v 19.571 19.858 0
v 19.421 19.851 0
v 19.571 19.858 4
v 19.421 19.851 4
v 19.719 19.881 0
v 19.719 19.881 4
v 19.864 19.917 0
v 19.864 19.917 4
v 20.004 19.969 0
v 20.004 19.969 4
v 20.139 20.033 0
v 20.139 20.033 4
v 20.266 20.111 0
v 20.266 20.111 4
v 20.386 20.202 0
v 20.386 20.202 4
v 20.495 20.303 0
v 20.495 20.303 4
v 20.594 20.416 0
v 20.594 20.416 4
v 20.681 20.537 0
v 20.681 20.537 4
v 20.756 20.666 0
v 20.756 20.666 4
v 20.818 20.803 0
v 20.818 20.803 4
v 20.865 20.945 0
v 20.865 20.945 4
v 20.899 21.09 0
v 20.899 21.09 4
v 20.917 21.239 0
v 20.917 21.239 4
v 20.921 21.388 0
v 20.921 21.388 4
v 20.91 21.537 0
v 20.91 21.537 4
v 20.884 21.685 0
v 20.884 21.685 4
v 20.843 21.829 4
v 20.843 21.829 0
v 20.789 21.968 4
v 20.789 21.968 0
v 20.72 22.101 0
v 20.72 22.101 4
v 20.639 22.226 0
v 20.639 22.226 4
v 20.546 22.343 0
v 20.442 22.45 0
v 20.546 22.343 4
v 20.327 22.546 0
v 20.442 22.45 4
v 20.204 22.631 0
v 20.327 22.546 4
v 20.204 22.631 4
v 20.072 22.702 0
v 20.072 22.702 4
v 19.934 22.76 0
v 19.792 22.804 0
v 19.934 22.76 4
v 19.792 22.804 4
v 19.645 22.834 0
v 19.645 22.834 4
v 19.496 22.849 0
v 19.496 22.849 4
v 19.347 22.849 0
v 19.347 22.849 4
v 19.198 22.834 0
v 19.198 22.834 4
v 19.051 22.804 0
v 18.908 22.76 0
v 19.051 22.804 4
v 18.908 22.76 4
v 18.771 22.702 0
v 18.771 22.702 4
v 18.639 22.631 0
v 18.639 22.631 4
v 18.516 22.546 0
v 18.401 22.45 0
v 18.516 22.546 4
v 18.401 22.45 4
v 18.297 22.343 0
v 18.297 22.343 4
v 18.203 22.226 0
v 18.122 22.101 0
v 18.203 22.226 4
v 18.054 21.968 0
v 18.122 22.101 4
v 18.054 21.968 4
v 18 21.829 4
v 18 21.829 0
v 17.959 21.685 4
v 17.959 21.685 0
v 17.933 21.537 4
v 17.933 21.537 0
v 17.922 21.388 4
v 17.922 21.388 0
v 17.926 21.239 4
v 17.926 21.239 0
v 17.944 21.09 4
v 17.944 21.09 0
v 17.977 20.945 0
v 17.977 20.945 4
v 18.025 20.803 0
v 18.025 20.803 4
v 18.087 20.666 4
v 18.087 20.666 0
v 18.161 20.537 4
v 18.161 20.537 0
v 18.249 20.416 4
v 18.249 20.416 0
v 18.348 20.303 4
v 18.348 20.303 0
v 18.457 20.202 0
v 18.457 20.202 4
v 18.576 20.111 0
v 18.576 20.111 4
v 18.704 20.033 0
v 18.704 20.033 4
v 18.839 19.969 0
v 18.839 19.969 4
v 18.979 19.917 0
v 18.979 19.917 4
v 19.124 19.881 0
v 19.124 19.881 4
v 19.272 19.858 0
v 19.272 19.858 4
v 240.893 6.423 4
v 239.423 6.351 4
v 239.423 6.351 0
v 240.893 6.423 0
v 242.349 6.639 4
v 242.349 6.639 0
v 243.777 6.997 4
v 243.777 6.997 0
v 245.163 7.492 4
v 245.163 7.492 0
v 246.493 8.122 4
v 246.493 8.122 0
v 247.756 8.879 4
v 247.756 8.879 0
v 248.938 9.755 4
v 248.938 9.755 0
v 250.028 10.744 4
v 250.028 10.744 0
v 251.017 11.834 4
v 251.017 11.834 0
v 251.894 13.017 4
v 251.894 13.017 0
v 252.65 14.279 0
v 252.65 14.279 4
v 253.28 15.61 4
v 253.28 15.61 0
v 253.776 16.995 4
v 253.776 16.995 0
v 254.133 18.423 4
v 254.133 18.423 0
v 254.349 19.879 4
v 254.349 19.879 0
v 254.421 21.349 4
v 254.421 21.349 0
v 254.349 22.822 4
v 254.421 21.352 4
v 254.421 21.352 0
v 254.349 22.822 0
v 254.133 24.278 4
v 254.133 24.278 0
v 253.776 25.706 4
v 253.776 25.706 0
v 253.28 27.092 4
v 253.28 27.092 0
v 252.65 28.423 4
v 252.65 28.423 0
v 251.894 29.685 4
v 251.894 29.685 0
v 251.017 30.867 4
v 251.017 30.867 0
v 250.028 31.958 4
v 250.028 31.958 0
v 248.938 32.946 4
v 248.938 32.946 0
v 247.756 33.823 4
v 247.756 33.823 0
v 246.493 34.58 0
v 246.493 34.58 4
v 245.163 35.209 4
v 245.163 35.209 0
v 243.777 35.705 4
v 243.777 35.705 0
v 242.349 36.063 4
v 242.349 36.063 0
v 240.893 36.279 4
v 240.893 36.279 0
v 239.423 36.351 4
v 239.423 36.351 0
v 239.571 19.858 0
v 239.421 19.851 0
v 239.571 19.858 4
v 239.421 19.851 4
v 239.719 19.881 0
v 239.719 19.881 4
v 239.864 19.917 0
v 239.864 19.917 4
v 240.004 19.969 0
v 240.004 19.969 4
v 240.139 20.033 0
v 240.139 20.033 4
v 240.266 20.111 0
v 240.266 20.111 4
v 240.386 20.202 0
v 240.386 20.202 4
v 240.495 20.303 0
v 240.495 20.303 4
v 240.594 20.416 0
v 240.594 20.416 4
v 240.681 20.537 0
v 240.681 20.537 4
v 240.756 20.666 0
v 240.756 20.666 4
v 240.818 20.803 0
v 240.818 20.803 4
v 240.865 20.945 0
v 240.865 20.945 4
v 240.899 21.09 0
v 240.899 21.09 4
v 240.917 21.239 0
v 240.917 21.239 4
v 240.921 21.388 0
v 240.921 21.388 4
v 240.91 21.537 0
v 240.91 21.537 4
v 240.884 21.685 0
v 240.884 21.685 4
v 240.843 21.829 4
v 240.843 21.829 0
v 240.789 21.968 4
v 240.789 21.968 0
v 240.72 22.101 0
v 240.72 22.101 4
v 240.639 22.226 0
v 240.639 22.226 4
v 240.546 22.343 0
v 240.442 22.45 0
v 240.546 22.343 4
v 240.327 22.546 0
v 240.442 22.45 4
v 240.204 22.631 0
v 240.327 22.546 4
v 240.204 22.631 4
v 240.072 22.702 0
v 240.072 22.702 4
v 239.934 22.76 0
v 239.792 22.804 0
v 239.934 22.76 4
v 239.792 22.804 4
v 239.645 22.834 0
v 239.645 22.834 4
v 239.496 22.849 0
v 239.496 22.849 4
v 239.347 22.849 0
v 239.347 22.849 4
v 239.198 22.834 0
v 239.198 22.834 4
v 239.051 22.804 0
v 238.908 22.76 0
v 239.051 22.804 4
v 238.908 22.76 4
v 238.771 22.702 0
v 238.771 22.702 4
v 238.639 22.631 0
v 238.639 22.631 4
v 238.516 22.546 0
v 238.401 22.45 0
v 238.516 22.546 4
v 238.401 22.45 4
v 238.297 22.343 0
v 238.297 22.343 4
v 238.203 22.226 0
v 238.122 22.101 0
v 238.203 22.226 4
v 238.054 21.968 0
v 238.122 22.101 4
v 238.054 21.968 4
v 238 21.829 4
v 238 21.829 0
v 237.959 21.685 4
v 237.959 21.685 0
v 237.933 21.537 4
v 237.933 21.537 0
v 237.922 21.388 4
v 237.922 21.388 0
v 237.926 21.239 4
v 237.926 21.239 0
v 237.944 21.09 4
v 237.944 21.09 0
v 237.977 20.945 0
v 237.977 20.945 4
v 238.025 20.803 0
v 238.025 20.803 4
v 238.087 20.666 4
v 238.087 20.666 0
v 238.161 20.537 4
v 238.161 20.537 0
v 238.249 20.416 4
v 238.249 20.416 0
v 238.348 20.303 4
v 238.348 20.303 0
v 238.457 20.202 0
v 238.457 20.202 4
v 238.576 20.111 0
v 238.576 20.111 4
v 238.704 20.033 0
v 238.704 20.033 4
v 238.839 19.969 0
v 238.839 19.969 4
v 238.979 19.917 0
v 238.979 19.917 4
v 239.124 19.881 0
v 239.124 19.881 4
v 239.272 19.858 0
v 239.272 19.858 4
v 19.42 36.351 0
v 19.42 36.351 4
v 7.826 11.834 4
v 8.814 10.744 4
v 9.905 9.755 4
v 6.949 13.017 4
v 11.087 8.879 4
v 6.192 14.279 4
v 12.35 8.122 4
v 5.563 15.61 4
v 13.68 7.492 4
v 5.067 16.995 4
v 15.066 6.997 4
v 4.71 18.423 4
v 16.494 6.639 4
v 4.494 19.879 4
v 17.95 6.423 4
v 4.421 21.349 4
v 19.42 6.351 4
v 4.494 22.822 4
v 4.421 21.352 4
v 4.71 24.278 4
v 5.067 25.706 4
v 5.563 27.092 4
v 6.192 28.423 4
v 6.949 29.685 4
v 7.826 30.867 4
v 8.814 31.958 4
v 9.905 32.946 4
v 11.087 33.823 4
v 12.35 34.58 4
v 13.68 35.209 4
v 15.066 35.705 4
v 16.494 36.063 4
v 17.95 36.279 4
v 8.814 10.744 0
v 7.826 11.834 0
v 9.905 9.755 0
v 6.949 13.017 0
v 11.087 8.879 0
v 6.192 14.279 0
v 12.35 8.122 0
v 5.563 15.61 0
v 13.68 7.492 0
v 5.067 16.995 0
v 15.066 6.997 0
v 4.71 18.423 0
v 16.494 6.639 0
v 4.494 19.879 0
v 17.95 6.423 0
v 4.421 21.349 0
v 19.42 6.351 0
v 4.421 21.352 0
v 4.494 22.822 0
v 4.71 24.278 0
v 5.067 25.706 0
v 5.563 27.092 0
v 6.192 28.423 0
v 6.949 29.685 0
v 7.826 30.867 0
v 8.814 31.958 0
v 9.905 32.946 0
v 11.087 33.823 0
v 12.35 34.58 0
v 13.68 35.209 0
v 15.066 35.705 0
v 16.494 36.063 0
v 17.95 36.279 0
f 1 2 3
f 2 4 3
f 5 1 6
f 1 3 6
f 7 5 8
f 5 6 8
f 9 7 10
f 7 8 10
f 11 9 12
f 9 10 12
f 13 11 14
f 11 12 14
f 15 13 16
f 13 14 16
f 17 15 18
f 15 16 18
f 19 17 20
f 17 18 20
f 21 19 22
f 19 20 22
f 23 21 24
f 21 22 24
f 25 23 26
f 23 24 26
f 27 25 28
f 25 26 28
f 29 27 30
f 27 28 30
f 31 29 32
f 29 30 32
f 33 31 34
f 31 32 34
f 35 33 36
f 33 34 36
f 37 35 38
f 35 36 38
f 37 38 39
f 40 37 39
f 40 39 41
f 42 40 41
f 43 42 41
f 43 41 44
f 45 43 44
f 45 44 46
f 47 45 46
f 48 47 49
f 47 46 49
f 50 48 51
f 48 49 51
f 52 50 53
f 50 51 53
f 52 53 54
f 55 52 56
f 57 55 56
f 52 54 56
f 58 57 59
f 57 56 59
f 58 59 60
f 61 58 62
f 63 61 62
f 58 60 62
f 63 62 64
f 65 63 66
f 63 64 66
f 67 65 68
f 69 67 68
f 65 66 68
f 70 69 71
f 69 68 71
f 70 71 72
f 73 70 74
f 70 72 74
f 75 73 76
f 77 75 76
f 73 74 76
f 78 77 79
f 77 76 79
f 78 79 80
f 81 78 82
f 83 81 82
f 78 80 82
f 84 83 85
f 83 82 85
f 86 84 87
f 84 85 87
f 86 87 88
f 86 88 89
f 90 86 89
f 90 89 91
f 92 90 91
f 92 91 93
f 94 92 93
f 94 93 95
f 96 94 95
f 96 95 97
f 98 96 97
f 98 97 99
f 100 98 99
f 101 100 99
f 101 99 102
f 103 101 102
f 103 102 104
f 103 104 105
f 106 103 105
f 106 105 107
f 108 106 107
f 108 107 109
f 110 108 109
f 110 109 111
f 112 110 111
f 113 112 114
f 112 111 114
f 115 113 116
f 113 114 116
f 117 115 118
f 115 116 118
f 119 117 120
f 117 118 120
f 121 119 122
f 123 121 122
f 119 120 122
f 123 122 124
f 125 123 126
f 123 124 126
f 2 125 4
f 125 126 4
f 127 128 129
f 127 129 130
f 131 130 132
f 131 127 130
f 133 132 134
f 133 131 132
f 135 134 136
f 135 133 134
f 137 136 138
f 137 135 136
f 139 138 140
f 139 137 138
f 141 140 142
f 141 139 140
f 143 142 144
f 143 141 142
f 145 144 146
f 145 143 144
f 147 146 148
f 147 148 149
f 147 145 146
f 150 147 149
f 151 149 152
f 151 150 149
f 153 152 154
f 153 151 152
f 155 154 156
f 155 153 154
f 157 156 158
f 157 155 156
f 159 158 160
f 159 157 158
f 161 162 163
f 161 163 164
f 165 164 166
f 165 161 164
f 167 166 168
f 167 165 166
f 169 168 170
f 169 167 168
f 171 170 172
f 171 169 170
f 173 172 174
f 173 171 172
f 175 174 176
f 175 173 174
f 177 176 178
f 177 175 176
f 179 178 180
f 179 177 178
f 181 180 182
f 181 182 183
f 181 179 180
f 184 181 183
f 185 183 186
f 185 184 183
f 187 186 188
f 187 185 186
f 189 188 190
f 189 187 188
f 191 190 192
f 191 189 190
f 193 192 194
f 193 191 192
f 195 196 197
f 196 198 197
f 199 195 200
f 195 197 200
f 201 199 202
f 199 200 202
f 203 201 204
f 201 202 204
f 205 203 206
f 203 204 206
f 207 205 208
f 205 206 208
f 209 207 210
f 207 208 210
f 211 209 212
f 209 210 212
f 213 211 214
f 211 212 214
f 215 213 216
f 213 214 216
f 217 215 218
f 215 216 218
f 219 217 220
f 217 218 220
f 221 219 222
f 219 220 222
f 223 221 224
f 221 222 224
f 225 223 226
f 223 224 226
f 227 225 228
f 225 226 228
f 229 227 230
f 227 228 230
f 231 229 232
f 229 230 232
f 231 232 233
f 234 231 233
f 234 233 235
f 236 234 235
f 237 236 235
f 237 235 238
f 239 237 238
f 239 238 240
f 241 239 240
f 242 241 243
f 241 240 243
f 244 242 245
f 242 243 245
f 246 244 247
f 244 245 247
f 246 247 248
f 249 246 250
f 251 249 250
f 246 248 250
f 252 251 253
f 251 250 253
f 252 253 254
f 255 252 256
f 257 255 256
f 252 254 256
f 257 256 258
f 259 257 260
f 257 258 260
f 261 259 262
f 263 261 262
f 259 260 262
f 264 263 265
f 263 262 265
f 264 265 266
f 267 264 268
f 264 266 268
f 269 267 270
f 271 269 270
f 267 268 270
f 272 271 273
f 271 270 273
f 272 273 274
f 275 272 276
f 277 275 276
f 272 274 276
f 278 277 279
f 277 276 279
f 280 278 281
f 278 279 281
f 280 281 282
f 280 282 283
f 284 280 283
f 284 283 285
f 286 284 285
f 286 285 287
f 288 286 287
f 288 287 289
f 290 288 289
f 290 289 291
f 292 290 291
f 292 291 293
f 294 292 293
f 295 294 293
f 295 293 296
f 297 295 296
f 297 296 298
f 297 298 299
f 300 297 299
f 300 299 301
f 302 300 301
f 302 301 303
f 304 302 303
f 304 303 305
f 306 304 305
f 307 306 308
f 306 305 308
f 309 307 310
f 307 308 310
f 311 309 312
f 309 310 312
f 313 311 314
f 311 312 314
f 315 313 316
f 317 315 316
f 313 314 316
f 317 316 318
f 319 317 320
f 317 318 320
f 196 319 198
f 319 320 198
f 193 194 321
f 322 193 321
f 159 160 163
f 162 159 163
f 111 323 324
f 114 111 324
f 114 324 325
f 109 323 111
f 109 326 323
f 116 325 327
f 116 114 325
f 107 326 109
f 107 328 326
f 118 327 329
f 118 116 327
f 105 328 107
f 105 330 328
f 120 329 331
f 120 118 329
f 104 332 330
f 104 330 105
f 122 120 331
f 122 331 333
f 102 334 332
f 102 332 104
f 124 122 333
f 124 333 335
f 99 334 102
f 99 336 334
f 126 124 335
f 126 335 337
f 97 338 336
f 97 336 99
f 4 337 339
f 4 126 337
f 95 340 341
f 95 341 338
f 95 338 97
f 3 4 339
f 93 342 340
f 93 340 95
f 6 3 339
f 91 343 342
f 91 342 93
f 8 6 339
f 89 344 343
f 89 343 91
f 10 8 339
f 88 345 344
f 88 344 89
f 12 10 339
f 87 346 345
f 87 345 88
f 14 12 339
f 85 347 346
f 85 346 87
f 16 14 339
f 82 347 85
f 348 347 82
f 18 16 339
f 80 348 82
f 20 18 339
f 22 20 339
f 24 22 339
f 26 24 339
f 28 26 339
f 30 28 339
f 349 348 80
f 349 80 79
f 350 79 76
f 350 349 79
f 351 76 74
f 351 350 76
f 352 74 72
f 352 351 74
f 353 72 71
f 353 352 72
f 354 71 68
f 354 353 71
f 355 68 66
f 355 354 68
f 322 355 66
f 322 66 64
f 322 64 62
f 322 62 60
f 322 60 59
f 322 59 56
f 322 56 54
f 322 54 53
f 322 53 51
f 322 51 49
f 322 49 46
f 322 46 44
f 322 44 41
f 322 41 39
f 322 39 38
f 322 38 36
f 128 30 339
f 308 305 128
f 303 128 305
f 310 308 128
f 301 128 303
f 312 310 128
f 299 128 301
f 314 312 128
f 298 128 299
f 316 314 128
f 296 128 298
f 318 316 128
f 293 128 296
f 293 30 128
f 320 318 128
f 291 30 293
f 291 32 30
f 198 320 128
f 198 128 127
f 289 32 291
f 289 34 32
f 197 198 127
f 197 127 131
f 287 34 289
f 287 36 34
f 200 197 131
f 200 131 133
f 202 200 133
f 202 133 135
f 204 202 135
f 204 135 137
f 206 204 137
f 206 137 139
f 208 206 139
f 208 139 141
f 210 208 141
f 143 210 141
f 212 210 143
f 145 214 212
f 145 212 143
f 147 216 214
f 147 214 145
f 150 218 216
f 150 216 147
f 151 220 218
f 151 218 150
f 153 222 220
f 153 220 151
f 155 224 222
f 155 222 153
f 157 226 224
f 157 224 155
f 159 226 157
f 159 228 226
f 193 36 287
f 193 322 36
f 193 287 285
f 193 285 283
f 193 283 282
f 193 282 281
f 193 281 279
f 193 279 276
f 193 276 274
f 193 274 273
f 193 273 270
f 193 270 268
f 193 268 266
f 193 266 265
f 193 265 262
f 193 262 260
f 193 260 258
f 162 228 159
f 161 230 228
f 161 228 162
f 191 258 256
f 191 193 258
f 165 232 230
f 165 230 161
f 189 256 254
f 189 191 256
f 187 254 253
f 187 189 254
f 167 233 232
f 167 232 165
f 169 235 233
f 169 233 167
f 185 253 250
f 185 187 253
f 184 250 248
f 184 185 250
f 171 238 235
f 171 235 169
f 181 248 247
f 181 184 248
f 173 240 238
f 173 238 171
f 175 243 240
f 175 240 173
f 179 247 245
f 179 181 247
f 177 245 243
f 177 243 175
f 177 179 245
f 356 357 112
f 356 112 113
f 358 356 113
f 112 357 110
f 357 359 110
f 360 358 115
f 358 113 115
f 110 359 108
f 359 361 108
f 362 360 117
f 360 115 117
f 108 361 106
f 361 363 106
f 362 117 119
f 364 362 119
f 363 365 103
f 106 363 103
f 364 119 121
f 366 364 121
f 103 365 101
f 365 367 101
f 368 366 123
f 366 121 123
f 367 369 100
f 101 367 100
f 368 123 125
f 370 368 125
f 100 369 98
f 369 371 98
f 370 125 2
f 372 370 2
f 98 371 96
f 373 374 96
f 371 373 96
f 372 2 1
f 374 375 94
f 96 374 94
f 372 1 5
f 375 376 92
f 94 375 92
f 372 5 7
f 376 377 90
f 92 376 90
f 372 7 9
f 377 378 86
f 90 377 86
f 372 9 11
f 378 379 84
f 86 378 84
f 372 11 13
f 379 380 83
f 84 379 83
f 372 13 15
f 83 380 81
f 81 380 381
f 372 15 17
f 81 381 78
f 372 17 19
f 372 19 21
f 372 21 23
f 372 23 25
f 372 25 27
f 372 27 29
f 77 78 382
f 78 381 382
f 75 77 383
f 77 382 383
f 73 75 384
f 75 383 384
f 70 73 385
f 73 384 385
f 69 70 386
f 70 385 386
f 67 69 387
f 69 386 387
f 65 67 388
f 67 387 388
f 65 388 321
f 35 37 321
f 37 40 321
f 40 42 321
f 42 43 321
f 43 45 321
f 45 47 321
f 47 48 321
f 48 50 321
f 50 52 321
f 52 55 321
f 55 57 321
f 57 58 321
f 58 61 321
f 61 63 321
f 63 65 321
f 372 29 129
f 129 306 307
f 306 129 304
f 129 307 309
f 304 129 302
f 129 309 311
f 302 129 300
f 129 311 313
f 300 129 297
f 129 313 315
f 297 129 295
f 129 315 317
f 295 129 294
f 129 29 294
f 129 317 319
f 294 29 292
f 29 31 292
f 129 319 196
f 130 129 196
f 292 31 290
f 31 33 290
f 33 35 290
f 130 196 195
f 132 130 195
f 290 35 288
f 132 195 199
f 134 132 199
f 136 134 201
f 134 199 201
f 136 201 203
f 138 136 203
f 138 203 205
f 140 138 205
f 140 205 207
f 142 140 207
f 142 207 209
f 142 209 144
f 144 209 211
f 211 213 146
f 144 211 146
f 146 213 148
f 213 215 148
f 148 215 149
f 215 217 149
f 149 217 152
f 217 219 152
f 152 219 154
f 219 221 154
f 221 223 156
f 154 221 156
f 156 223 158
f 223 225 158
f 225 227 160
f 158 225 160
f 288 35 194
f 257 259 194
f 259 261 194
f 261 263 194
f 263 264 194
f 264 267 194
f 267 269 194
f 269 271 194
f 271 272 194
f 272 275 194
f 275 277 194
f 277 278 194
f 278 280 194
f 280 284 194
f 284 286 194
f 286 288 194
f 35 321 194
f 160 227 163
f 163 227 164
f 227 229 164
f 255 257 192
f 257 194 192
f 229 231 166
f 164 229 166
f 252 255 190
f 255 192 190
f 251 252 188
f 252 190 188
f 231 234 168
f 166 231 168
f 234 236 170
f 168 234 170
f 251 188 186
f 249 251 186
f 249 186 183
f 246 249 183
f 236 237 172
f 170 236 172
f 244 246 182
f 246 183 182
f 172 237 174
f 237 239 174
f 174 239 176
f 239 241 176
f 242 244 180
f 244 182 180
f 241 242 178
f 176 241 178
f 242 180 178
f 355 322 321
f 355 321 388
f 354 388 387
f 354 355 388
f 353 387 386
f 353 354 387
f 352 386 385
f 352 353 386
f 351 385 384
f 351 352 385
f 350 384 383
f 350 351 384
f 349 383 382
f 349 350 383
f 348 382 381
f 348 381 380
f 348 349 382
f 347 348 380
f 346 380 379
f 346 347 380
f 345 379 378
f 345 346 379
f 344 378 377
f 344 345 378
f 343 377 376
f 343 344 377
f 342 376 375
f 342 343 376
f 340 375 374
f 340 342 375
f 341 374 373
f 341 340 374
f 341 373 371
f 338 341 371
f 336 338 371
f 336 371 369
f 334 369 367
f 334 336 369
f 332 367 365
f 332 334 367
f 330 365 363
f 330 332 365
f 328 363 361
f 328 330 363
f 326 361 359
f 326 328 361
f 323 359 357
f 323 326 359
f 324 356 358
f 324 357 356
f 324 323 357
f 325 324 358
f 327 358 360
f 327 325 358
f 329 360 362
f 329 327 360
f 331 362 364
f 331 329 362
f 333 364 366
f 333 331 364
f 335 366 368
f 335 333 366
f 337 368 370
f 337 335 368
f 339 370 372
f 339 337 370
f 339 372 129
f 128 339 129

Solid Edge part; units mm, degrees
sketch "Sketch1" plane through (0, 0, 0) normal (0, 0, 1) x (1, 0, 0)
  line L0 (4.4214, 6.3508) -> (254.4214, 6.3508)
  line L1 (254.4214, 6.3508) -> (254.4214, 36.3508)
  line L2 (254.4214, 36.3508) -> (4.4214, 36.3508)
  line L3 (4.4214, 36.3508) -> (4.4214, 6.3508)
extrude "Protrusion1" add sketch "Sketch1" along normal blind 4
fillet "Redondo_1" radius 15 4 edges at (254.4214, 6.3508, 2) (254.4214, 36.3508, 2) (4.4214, 6.3508, 2) (4.4214, 36.3508, 2)
hole "Furo_8" at (19.4214, 21.3508, 4) direction (0, 0, -1) diameter 3 end up to next
hole "Hole1" at (239.4214, 21.3508, 4) direction (0, 0, -1) diameter 3 end up to next
